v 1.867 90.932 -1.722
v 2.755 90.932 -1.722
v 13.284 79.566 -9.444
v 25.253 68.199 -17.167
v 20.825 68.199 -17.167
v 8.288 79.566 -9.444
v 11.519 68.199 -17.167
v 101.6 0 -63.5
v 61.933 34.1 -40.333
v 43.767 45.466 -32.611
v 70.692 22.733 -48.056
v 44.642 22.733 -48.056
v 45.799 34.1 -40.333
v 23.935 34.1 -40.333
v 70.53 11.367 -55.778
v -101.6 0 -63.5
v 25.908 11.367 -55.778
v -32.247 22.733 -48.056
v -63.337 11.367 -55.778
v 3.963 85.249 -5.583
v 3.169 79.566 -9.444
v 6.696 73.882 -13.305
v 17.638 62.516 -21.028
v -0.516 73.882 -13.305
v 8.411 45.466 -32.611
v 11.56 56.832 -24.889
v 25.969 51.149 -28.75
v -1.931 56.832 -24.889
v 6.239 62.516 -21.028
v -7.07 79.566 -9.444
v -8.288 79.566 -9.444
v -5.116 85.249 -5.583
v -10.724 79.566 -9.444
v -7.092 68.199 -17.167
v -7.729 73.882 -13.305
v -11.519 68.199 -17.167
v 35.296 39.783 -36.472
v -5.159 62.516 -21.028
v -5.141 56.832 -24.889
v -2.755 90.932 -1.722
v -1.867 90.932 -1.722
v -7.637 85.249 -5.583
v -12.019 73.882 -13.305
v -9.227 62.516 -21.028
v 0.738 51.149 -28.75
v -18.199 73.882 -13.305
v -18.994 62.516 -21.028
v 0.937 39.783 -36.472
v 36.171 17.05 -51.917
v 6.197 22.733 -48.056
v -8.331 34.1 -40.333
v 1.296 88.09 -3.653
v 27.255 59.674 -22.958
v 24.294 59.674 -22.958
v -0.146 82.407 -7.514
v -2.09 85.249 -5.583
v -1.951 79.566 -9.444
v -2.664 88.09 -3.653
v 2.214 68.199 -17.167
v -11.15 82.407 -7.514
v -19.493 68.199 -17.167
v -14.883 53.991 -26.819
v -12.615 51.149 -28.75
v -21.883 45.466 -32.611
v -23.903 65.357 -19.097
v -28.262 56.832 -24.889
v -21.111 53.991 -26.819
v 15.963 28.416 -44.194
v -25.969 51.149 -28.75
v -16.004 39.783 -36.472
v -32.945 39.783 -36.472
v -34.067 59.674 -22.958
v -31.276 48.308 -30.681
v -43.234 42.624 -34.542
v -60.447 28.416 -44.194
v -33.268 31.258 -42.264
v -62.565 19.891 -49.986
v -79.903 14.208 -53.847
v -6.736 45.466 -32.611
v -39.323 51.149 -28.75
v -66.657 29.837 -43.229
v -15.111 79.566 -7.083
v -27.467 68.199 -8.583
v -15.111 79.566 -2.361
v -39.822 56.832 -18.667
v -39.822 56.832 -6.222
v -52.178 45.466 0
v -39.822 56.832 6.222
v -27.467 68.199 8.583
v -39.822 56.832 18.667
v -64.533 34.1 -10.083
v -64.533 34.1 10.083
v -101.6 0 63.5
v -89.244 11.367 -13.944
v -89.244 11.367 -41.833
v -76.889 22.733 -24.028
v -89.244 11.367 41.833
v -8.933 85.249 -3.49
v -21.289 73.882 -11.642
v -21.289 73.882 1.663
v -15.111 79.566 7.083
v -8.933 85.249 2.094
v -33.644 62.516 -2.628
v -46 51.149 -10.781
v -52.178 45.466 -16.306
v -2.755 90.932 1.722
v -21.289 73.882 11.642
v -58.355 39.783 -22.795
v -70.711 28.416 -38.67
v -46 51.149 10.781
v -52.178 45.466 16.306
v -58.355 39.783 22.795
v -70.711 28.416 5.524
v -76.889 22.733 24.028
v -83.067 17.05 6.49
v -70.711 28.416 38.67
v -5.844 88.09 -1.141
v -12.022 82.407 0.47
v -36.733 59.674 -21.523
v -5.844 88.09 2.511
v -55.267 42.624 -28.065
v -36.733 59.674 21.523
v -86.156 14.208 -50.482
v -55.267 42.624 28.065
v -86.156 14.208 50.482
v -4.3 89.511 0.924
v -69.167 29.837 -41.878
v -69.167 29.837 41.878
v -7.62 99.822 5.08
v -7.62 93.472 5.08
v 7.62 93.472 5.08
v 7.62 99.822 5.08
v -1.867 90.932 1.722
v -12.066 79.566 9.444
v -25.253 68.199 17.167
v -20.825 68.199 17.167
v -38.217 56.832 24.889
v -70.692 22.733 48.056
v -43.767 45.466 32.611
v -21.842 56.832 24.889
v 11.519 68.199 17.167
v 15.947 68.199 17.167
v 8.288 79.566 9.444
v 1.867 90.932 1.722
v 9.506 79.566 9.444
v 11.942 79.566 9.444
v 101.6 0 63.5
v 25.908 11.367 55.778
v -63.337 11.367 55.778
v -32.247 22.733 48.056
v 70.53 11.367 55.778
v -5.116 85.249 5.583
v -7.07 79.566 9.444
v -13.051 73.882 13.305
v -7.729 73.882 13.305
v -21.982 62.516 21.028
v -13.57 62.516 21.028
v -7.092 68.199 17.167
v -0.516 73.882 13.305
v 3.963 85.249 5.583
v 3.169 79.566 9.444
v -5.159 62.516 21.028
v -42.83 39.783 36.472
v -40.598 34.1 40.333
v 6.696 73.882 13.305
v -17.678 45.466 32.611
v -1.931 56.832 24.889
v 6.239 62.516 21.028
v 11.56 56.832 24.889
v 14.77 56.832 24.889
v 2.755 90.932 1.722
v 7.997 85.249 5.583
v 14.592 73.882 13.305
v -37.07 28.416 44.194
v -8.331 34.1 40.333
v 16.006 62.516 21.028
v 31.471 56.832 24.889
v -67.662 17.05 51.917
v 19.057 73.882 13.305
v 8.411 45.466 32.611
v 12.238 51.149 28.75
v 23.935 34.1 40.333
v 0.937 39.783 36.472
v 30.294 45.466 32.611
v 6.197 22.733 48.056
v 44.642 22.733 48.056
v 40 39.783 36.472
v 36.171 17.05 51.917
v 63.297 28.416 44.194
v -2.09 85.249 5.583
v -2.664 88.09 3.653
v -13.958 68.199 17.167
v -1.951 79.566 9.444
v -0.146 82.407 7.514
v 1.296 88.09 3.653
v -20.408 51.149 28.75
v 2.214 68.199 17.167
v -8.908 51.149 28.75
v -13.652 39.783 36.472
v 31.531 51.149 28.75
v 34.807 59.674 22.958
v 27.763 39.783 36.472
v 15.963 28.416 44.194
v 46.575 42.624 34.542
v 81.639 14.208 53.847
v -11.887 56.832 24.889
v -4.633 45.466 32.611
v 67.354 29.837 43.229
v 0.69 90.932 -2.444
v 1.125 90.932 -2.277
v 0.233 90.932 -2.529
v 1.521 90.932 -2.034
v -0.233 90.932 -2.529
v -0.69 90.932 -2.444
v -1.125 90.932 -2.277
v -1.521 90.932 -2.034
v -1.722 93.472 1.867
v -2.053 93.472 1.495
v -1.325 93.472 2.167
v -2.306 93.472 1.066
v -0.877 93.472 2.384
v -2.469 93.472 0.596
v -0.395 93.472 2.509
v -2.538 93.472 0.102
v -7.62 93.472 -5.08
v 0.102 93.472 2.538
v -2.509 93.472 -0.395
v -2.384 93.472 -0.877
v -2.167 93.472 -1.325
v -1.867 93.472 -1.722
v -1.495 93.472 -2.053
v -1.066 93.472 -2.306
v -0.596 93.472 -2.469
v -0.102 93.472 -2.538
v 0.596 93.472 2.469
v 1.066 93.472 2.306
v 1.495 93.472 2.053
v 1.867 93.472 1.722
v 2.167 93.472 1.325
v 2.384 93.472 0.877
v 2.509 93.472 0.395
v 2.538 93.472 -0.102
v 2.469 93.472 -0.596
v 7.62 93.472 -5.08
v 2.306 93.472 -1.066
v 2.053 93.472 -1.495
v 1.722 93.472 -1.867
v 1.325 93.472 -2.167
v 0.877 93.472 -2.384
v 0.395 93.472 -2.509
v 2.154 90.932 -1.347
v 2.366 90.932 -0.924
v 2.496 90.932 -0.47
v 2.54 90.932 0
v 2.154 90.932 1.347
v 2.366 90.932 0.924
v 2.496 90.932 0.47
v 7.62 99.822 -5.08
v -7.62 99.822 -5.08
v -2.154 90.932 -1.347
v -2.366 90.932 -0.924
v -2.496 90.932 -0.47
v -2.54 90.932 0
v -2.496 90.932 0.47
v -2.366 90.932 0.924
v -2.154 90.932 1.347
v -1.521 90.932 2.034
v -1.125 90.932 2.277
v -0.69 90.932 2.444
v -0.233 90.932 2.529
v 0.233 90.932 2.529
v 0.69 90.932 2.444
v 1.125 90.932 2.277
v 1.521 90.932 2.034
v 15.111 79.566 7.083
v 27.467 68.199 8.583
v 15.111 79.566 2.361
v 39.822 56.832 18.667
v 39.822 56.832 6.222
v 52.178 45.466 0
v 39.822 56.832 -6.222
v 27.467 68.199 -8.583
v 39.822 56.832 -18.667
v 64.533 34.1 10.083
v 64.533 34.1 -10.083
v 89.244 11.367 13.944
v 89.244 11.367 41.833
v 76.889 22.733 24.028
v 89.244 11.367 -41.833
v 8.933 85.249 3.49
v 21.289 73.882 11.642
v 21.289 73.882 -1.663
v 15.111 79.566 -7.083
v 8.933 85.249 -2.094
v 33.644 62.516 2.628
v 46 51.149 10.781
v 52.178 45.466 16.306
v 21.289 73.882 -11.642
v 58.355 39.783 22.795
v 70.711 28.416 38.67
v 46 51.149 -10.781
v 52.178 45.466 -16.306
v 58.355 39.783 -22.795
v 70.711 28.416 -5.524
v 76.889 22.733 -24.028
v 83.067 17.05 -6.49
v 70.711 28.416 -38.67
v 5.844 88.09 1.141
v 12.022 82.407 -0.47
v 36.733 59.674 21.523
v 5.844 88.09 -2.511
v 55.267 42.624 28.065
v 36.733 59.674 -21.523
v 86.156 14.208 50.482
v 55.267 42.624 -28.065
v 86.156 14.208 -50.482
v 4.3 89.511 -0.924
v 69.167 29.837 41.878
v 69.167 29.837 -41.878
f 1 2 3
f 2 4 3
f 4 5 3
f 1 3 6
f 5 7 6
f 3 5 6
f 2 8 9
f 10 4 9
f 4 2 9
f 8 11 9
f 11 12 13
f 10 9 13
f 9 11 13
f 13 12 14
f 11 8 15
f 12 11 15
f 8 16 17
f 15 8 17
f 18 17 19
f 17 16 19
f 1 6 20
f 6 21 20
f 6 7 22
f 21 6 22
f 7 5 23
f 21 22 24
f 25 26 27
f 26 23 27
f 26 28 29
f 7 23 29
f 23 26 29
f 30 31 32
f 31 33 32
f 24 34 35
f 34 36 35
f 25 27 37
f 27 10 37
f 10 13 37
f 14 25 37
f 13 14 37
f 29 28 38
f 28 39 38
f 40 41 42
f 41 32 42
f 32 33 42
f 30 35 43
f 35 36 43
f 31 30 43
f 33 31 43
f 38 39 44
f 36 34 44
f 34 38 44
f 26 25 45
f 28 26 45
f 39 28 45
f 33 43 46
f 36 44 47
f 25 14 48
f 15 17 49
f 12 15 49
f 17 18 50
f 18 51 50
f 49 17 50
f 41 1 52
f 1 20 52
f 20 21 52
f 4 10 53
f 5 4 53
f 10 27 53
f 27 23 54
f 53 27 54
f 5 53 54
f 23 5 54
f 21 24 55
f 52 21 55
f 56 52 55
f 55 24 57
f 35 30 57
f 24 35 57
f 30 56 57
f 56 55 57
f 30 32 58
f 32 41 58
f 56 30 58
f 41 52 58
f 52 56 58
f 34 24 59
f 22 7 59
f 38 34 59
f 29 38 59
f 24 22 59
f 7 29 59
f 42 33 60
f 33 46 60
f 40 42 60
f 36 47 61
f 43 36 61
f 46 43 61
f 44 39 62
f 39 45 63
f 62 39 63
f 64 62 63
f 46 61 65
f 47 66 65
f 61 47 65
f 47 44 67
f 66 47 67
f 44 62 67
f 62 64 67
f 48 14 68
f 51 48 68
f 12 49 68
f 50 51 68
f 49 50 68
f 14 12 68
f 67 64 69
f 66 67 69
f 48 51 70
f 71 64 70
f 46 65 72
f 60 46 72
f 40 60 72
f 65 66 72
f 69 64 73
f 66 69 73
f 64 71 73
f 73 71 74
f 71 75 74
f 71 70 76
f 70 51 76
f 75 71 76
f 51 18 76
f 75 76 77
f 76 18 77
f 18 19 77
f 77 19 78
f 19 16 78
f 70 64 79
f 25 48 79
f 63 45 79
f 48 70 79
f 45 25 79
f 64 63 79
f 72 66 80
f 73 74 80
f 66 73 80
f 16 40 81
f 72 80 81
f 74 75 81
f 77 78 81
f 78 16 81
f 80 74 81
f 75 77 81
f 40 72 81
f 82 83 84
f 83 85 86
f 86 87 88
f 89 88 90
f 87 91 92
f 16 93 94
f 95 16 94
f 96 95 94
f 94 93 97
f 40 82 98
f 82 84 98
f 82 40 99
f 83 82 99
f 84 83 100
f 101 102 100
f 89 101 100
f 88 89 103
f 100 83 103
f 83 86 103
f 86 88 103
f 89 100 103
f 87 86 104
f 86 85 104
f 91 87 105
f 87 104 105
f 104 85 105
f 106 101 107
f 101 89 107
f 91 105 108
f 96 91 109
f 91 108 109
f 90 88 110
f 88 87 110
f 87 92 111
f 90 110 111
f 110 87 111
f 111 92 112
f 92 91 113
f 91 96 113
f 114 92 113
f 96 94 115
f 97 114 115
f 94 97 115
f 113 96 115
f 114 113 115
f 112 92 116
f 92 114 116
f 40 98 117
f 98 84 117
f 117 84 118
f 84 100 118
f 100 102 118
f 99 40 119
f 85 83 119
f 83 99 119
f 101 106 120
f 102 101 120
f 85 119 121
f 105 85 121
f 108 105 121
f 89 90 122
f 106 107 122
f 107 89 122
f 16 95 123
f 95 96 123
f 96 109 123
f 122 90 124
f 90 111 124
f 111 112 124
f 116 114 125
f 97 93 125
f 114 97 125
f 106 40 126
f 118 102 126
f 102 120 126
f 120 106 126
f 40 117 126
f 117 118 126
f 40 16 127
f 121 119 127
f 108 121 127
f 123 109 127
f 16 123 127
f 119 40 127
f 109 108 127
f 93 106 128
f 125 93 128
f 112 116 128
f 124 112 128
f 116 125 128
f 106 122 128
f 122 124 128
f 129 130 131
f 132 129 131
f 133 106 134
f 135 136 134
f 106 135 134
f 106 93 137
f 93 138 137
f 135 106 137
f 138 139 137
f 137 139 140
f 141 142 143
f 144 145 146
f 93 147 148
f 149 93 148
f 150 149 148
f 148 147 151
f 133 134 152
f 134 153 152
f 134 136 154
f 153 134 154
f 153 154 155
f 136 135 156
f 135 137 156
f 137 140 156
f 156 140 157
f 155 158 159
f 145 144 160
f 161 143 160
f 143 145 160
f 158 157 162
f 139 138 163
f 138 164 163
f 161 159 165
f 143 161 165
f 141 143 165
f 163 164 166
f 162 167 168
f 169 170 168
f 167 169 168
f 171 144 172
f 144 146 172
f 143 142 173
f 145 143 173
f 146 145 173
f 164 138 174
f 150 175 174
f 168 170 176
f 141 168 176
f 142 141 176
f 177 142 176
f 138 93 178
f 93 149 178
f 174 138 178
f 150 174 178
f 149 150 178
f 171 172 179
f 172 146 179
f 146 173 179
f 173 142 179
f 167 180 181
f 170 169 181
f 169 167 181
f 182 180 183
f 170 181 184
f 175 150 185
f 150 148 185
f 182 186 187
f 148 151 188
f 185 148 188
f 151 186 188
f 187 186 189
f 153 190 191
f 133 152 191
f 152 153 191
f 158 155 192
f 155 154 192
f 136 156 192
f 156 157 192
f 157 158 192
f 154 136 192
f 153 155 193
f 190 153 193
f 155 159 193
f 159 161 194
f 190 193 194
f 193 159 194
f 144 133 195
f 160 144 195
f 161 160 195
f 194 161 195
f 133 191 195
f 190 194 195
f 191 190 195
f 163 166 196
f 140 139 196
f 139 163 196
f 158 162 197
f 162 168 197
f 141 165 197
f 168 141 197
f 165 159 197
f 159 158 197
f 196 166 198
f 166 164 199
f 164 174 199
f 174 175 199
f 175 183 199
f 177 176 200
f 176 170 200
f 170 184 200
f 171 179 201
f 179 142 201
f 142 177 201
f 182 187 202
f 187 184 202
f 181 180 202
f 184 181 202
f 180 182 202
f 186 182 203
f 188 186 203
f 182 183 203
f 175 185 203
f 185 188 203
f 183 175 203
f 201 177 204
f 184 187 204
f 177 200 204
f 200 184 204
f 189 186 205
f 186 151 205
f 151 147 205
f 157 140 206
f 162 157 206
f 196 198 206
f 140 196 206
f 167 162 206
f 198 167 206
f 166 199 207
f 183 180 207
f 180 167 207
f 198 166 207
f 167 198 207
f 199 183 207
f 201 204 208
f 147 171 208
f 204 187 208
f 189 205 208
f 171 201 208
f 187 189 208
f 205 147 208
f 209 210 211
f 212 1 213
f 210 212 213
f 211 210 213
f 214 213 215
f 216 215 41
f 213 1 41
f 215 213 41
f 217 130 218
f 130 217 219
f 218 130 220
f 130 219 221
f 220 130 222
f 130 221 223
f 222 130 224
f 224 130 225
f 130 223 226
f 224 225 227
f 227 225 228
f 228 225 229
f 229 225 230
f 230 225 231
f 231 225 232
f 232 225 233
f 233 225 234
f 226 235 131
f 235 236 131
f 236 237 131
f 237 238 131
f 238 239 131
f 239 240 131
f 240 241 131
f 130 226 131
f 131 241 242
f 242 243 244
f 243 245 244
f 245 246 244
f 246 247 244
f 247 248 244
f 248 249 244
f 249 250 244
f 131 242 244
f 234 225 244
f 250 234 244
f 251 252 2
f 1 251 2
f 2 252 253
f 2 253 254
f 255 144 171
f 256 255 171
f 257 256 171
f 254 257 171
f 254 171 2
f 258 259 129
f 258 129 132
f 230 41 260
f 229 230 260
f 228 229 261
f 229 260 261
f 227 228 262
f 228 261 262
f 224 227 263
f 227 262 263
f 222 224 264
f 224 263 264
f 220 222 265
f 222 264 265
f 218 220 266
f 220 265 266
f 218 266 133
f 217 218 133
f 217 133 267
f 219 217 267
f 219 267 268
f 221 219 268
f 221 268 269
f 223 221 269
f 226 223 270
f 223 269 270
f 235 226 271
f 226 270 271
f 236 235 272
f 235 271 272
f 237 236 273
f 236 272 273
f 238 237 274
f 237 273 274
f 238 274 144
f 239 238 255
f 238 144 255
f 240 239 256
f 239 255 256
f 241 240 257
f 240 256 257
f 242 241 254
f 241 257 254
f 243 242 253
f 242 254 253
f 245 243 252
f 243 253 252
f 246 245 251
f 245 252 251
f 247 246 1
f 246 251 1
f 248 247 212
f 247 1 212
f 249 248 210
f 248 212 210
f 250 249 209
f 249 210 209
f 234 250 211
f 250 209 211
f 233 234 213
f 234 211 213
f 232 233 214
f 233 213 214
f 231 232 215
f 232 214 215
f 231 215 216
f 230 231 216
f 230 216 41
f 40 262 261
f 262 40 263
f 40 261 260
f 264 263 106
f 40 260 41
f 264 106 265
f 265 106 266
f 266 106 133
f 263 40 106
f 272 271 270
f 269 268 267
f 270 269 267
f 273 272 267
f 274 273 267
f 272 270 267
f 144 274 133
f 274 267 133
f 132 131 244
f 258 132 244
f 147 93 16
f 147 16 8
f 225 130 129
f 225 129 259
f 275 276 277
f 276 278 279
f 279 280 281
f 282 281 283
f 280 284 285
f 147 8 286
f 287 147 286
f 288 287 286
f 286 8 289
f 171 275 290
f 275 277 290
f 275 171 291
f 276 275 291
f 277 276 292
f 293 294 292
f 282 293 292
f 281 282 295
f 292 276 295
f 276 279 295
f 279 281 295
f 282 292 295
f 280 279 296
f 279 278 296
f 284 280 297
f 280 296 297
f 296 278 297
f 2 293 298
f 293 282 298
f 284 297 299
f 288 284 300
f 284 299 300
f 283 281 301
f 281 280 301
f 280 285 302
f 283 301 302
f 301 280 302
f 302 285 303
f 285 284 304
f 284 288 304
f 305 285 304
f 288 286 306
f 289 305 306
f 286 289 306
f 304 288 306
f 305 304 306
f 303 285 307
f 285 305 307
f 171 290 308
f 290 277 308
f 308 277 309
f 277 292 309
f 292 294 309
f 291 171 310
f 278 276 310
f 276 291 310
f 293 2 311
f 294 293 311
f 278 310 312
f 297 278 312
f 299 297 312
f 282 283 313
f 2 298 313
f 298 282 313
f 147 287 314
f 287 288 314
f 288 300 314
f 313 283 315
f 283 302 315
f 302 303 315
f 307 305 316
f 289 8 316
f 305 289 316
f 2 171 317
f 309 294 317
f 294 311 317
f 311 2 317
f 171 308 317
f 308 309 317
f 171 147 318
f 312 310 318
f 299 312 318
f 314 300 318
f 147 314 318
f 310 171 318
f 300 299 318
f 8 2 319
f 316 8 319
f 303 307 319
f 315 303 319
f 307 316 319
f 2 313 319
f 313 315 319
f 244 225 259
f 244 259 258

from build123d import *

# Parameters (mm, degrees)
SKETCH3_R         = 2.54
CAMERA_LENS_DEPTH = 2.54
SKETCH4_W         = 15.24
SKETCH4_H         = 10.16
CAMERA_BODY_DEPTH = 6.35


with BuildPart() as part:
    # Sketch2 → FOV section 0
    with BuildSketch(Plane(origin=(0, 90.932, 0), x_dir=(1, 0, 0), z_dir=(0, 1, 0))):
        with BuildLine():
            Line((-2.755394972, -1.722121857), (2.755394972, -1.722121857))
            Line((2.755394972, -1.722121857), (2.755394972, 1.722121857))
            Line((2.755394972, 1.722121857), (-2.755394972, 1.722121857))
            Line((-2.755394972, 1.722121857), (-2.755394972, -1.722121857))
        make_face()
    # Sketch1 → FOV section 1
    with BuildSketch(Plane(origin=(0, 0, 0), x_dir=(1, 0, 0), z_dir=(0, 1, 0))):
        with BuildLine():
            Line((-101.6, -63.5), (101.6, -63.5))
            Line((101.6, -63.5), (101.6, 63.5))
            Line((101.6, 63.5), (-101.6, 63.5))
            Line((-101.6, 63.5), (-101.6, -63.5))
        make_face()
    loft()

    # Sketch3 → camera lens (add)
    with BuildSketch(Plane(origin=(0, 90.932, 0), x_dir=(1, 0, 0), z_dir=(0, 1, 0))):
        with Locations(Location((0, 0, 0), (0, 0, 137.312390012))):
            Circle(SKETCH3_R)
    extrude(amount=CAMERA_LENS_DEPTH)

    # Sketch4 → camera body (add)
    with BuildSketch(Plane(origin=(0, 93.472, 0), x_dir=(1, 0, 0), z_dir=(0, 1, 0))):
        Rectangle(SKETCH4_W, SKETCH4_H)
    extrude(amount=CAMERA_BODY_DEPTH)


solid = part.part
